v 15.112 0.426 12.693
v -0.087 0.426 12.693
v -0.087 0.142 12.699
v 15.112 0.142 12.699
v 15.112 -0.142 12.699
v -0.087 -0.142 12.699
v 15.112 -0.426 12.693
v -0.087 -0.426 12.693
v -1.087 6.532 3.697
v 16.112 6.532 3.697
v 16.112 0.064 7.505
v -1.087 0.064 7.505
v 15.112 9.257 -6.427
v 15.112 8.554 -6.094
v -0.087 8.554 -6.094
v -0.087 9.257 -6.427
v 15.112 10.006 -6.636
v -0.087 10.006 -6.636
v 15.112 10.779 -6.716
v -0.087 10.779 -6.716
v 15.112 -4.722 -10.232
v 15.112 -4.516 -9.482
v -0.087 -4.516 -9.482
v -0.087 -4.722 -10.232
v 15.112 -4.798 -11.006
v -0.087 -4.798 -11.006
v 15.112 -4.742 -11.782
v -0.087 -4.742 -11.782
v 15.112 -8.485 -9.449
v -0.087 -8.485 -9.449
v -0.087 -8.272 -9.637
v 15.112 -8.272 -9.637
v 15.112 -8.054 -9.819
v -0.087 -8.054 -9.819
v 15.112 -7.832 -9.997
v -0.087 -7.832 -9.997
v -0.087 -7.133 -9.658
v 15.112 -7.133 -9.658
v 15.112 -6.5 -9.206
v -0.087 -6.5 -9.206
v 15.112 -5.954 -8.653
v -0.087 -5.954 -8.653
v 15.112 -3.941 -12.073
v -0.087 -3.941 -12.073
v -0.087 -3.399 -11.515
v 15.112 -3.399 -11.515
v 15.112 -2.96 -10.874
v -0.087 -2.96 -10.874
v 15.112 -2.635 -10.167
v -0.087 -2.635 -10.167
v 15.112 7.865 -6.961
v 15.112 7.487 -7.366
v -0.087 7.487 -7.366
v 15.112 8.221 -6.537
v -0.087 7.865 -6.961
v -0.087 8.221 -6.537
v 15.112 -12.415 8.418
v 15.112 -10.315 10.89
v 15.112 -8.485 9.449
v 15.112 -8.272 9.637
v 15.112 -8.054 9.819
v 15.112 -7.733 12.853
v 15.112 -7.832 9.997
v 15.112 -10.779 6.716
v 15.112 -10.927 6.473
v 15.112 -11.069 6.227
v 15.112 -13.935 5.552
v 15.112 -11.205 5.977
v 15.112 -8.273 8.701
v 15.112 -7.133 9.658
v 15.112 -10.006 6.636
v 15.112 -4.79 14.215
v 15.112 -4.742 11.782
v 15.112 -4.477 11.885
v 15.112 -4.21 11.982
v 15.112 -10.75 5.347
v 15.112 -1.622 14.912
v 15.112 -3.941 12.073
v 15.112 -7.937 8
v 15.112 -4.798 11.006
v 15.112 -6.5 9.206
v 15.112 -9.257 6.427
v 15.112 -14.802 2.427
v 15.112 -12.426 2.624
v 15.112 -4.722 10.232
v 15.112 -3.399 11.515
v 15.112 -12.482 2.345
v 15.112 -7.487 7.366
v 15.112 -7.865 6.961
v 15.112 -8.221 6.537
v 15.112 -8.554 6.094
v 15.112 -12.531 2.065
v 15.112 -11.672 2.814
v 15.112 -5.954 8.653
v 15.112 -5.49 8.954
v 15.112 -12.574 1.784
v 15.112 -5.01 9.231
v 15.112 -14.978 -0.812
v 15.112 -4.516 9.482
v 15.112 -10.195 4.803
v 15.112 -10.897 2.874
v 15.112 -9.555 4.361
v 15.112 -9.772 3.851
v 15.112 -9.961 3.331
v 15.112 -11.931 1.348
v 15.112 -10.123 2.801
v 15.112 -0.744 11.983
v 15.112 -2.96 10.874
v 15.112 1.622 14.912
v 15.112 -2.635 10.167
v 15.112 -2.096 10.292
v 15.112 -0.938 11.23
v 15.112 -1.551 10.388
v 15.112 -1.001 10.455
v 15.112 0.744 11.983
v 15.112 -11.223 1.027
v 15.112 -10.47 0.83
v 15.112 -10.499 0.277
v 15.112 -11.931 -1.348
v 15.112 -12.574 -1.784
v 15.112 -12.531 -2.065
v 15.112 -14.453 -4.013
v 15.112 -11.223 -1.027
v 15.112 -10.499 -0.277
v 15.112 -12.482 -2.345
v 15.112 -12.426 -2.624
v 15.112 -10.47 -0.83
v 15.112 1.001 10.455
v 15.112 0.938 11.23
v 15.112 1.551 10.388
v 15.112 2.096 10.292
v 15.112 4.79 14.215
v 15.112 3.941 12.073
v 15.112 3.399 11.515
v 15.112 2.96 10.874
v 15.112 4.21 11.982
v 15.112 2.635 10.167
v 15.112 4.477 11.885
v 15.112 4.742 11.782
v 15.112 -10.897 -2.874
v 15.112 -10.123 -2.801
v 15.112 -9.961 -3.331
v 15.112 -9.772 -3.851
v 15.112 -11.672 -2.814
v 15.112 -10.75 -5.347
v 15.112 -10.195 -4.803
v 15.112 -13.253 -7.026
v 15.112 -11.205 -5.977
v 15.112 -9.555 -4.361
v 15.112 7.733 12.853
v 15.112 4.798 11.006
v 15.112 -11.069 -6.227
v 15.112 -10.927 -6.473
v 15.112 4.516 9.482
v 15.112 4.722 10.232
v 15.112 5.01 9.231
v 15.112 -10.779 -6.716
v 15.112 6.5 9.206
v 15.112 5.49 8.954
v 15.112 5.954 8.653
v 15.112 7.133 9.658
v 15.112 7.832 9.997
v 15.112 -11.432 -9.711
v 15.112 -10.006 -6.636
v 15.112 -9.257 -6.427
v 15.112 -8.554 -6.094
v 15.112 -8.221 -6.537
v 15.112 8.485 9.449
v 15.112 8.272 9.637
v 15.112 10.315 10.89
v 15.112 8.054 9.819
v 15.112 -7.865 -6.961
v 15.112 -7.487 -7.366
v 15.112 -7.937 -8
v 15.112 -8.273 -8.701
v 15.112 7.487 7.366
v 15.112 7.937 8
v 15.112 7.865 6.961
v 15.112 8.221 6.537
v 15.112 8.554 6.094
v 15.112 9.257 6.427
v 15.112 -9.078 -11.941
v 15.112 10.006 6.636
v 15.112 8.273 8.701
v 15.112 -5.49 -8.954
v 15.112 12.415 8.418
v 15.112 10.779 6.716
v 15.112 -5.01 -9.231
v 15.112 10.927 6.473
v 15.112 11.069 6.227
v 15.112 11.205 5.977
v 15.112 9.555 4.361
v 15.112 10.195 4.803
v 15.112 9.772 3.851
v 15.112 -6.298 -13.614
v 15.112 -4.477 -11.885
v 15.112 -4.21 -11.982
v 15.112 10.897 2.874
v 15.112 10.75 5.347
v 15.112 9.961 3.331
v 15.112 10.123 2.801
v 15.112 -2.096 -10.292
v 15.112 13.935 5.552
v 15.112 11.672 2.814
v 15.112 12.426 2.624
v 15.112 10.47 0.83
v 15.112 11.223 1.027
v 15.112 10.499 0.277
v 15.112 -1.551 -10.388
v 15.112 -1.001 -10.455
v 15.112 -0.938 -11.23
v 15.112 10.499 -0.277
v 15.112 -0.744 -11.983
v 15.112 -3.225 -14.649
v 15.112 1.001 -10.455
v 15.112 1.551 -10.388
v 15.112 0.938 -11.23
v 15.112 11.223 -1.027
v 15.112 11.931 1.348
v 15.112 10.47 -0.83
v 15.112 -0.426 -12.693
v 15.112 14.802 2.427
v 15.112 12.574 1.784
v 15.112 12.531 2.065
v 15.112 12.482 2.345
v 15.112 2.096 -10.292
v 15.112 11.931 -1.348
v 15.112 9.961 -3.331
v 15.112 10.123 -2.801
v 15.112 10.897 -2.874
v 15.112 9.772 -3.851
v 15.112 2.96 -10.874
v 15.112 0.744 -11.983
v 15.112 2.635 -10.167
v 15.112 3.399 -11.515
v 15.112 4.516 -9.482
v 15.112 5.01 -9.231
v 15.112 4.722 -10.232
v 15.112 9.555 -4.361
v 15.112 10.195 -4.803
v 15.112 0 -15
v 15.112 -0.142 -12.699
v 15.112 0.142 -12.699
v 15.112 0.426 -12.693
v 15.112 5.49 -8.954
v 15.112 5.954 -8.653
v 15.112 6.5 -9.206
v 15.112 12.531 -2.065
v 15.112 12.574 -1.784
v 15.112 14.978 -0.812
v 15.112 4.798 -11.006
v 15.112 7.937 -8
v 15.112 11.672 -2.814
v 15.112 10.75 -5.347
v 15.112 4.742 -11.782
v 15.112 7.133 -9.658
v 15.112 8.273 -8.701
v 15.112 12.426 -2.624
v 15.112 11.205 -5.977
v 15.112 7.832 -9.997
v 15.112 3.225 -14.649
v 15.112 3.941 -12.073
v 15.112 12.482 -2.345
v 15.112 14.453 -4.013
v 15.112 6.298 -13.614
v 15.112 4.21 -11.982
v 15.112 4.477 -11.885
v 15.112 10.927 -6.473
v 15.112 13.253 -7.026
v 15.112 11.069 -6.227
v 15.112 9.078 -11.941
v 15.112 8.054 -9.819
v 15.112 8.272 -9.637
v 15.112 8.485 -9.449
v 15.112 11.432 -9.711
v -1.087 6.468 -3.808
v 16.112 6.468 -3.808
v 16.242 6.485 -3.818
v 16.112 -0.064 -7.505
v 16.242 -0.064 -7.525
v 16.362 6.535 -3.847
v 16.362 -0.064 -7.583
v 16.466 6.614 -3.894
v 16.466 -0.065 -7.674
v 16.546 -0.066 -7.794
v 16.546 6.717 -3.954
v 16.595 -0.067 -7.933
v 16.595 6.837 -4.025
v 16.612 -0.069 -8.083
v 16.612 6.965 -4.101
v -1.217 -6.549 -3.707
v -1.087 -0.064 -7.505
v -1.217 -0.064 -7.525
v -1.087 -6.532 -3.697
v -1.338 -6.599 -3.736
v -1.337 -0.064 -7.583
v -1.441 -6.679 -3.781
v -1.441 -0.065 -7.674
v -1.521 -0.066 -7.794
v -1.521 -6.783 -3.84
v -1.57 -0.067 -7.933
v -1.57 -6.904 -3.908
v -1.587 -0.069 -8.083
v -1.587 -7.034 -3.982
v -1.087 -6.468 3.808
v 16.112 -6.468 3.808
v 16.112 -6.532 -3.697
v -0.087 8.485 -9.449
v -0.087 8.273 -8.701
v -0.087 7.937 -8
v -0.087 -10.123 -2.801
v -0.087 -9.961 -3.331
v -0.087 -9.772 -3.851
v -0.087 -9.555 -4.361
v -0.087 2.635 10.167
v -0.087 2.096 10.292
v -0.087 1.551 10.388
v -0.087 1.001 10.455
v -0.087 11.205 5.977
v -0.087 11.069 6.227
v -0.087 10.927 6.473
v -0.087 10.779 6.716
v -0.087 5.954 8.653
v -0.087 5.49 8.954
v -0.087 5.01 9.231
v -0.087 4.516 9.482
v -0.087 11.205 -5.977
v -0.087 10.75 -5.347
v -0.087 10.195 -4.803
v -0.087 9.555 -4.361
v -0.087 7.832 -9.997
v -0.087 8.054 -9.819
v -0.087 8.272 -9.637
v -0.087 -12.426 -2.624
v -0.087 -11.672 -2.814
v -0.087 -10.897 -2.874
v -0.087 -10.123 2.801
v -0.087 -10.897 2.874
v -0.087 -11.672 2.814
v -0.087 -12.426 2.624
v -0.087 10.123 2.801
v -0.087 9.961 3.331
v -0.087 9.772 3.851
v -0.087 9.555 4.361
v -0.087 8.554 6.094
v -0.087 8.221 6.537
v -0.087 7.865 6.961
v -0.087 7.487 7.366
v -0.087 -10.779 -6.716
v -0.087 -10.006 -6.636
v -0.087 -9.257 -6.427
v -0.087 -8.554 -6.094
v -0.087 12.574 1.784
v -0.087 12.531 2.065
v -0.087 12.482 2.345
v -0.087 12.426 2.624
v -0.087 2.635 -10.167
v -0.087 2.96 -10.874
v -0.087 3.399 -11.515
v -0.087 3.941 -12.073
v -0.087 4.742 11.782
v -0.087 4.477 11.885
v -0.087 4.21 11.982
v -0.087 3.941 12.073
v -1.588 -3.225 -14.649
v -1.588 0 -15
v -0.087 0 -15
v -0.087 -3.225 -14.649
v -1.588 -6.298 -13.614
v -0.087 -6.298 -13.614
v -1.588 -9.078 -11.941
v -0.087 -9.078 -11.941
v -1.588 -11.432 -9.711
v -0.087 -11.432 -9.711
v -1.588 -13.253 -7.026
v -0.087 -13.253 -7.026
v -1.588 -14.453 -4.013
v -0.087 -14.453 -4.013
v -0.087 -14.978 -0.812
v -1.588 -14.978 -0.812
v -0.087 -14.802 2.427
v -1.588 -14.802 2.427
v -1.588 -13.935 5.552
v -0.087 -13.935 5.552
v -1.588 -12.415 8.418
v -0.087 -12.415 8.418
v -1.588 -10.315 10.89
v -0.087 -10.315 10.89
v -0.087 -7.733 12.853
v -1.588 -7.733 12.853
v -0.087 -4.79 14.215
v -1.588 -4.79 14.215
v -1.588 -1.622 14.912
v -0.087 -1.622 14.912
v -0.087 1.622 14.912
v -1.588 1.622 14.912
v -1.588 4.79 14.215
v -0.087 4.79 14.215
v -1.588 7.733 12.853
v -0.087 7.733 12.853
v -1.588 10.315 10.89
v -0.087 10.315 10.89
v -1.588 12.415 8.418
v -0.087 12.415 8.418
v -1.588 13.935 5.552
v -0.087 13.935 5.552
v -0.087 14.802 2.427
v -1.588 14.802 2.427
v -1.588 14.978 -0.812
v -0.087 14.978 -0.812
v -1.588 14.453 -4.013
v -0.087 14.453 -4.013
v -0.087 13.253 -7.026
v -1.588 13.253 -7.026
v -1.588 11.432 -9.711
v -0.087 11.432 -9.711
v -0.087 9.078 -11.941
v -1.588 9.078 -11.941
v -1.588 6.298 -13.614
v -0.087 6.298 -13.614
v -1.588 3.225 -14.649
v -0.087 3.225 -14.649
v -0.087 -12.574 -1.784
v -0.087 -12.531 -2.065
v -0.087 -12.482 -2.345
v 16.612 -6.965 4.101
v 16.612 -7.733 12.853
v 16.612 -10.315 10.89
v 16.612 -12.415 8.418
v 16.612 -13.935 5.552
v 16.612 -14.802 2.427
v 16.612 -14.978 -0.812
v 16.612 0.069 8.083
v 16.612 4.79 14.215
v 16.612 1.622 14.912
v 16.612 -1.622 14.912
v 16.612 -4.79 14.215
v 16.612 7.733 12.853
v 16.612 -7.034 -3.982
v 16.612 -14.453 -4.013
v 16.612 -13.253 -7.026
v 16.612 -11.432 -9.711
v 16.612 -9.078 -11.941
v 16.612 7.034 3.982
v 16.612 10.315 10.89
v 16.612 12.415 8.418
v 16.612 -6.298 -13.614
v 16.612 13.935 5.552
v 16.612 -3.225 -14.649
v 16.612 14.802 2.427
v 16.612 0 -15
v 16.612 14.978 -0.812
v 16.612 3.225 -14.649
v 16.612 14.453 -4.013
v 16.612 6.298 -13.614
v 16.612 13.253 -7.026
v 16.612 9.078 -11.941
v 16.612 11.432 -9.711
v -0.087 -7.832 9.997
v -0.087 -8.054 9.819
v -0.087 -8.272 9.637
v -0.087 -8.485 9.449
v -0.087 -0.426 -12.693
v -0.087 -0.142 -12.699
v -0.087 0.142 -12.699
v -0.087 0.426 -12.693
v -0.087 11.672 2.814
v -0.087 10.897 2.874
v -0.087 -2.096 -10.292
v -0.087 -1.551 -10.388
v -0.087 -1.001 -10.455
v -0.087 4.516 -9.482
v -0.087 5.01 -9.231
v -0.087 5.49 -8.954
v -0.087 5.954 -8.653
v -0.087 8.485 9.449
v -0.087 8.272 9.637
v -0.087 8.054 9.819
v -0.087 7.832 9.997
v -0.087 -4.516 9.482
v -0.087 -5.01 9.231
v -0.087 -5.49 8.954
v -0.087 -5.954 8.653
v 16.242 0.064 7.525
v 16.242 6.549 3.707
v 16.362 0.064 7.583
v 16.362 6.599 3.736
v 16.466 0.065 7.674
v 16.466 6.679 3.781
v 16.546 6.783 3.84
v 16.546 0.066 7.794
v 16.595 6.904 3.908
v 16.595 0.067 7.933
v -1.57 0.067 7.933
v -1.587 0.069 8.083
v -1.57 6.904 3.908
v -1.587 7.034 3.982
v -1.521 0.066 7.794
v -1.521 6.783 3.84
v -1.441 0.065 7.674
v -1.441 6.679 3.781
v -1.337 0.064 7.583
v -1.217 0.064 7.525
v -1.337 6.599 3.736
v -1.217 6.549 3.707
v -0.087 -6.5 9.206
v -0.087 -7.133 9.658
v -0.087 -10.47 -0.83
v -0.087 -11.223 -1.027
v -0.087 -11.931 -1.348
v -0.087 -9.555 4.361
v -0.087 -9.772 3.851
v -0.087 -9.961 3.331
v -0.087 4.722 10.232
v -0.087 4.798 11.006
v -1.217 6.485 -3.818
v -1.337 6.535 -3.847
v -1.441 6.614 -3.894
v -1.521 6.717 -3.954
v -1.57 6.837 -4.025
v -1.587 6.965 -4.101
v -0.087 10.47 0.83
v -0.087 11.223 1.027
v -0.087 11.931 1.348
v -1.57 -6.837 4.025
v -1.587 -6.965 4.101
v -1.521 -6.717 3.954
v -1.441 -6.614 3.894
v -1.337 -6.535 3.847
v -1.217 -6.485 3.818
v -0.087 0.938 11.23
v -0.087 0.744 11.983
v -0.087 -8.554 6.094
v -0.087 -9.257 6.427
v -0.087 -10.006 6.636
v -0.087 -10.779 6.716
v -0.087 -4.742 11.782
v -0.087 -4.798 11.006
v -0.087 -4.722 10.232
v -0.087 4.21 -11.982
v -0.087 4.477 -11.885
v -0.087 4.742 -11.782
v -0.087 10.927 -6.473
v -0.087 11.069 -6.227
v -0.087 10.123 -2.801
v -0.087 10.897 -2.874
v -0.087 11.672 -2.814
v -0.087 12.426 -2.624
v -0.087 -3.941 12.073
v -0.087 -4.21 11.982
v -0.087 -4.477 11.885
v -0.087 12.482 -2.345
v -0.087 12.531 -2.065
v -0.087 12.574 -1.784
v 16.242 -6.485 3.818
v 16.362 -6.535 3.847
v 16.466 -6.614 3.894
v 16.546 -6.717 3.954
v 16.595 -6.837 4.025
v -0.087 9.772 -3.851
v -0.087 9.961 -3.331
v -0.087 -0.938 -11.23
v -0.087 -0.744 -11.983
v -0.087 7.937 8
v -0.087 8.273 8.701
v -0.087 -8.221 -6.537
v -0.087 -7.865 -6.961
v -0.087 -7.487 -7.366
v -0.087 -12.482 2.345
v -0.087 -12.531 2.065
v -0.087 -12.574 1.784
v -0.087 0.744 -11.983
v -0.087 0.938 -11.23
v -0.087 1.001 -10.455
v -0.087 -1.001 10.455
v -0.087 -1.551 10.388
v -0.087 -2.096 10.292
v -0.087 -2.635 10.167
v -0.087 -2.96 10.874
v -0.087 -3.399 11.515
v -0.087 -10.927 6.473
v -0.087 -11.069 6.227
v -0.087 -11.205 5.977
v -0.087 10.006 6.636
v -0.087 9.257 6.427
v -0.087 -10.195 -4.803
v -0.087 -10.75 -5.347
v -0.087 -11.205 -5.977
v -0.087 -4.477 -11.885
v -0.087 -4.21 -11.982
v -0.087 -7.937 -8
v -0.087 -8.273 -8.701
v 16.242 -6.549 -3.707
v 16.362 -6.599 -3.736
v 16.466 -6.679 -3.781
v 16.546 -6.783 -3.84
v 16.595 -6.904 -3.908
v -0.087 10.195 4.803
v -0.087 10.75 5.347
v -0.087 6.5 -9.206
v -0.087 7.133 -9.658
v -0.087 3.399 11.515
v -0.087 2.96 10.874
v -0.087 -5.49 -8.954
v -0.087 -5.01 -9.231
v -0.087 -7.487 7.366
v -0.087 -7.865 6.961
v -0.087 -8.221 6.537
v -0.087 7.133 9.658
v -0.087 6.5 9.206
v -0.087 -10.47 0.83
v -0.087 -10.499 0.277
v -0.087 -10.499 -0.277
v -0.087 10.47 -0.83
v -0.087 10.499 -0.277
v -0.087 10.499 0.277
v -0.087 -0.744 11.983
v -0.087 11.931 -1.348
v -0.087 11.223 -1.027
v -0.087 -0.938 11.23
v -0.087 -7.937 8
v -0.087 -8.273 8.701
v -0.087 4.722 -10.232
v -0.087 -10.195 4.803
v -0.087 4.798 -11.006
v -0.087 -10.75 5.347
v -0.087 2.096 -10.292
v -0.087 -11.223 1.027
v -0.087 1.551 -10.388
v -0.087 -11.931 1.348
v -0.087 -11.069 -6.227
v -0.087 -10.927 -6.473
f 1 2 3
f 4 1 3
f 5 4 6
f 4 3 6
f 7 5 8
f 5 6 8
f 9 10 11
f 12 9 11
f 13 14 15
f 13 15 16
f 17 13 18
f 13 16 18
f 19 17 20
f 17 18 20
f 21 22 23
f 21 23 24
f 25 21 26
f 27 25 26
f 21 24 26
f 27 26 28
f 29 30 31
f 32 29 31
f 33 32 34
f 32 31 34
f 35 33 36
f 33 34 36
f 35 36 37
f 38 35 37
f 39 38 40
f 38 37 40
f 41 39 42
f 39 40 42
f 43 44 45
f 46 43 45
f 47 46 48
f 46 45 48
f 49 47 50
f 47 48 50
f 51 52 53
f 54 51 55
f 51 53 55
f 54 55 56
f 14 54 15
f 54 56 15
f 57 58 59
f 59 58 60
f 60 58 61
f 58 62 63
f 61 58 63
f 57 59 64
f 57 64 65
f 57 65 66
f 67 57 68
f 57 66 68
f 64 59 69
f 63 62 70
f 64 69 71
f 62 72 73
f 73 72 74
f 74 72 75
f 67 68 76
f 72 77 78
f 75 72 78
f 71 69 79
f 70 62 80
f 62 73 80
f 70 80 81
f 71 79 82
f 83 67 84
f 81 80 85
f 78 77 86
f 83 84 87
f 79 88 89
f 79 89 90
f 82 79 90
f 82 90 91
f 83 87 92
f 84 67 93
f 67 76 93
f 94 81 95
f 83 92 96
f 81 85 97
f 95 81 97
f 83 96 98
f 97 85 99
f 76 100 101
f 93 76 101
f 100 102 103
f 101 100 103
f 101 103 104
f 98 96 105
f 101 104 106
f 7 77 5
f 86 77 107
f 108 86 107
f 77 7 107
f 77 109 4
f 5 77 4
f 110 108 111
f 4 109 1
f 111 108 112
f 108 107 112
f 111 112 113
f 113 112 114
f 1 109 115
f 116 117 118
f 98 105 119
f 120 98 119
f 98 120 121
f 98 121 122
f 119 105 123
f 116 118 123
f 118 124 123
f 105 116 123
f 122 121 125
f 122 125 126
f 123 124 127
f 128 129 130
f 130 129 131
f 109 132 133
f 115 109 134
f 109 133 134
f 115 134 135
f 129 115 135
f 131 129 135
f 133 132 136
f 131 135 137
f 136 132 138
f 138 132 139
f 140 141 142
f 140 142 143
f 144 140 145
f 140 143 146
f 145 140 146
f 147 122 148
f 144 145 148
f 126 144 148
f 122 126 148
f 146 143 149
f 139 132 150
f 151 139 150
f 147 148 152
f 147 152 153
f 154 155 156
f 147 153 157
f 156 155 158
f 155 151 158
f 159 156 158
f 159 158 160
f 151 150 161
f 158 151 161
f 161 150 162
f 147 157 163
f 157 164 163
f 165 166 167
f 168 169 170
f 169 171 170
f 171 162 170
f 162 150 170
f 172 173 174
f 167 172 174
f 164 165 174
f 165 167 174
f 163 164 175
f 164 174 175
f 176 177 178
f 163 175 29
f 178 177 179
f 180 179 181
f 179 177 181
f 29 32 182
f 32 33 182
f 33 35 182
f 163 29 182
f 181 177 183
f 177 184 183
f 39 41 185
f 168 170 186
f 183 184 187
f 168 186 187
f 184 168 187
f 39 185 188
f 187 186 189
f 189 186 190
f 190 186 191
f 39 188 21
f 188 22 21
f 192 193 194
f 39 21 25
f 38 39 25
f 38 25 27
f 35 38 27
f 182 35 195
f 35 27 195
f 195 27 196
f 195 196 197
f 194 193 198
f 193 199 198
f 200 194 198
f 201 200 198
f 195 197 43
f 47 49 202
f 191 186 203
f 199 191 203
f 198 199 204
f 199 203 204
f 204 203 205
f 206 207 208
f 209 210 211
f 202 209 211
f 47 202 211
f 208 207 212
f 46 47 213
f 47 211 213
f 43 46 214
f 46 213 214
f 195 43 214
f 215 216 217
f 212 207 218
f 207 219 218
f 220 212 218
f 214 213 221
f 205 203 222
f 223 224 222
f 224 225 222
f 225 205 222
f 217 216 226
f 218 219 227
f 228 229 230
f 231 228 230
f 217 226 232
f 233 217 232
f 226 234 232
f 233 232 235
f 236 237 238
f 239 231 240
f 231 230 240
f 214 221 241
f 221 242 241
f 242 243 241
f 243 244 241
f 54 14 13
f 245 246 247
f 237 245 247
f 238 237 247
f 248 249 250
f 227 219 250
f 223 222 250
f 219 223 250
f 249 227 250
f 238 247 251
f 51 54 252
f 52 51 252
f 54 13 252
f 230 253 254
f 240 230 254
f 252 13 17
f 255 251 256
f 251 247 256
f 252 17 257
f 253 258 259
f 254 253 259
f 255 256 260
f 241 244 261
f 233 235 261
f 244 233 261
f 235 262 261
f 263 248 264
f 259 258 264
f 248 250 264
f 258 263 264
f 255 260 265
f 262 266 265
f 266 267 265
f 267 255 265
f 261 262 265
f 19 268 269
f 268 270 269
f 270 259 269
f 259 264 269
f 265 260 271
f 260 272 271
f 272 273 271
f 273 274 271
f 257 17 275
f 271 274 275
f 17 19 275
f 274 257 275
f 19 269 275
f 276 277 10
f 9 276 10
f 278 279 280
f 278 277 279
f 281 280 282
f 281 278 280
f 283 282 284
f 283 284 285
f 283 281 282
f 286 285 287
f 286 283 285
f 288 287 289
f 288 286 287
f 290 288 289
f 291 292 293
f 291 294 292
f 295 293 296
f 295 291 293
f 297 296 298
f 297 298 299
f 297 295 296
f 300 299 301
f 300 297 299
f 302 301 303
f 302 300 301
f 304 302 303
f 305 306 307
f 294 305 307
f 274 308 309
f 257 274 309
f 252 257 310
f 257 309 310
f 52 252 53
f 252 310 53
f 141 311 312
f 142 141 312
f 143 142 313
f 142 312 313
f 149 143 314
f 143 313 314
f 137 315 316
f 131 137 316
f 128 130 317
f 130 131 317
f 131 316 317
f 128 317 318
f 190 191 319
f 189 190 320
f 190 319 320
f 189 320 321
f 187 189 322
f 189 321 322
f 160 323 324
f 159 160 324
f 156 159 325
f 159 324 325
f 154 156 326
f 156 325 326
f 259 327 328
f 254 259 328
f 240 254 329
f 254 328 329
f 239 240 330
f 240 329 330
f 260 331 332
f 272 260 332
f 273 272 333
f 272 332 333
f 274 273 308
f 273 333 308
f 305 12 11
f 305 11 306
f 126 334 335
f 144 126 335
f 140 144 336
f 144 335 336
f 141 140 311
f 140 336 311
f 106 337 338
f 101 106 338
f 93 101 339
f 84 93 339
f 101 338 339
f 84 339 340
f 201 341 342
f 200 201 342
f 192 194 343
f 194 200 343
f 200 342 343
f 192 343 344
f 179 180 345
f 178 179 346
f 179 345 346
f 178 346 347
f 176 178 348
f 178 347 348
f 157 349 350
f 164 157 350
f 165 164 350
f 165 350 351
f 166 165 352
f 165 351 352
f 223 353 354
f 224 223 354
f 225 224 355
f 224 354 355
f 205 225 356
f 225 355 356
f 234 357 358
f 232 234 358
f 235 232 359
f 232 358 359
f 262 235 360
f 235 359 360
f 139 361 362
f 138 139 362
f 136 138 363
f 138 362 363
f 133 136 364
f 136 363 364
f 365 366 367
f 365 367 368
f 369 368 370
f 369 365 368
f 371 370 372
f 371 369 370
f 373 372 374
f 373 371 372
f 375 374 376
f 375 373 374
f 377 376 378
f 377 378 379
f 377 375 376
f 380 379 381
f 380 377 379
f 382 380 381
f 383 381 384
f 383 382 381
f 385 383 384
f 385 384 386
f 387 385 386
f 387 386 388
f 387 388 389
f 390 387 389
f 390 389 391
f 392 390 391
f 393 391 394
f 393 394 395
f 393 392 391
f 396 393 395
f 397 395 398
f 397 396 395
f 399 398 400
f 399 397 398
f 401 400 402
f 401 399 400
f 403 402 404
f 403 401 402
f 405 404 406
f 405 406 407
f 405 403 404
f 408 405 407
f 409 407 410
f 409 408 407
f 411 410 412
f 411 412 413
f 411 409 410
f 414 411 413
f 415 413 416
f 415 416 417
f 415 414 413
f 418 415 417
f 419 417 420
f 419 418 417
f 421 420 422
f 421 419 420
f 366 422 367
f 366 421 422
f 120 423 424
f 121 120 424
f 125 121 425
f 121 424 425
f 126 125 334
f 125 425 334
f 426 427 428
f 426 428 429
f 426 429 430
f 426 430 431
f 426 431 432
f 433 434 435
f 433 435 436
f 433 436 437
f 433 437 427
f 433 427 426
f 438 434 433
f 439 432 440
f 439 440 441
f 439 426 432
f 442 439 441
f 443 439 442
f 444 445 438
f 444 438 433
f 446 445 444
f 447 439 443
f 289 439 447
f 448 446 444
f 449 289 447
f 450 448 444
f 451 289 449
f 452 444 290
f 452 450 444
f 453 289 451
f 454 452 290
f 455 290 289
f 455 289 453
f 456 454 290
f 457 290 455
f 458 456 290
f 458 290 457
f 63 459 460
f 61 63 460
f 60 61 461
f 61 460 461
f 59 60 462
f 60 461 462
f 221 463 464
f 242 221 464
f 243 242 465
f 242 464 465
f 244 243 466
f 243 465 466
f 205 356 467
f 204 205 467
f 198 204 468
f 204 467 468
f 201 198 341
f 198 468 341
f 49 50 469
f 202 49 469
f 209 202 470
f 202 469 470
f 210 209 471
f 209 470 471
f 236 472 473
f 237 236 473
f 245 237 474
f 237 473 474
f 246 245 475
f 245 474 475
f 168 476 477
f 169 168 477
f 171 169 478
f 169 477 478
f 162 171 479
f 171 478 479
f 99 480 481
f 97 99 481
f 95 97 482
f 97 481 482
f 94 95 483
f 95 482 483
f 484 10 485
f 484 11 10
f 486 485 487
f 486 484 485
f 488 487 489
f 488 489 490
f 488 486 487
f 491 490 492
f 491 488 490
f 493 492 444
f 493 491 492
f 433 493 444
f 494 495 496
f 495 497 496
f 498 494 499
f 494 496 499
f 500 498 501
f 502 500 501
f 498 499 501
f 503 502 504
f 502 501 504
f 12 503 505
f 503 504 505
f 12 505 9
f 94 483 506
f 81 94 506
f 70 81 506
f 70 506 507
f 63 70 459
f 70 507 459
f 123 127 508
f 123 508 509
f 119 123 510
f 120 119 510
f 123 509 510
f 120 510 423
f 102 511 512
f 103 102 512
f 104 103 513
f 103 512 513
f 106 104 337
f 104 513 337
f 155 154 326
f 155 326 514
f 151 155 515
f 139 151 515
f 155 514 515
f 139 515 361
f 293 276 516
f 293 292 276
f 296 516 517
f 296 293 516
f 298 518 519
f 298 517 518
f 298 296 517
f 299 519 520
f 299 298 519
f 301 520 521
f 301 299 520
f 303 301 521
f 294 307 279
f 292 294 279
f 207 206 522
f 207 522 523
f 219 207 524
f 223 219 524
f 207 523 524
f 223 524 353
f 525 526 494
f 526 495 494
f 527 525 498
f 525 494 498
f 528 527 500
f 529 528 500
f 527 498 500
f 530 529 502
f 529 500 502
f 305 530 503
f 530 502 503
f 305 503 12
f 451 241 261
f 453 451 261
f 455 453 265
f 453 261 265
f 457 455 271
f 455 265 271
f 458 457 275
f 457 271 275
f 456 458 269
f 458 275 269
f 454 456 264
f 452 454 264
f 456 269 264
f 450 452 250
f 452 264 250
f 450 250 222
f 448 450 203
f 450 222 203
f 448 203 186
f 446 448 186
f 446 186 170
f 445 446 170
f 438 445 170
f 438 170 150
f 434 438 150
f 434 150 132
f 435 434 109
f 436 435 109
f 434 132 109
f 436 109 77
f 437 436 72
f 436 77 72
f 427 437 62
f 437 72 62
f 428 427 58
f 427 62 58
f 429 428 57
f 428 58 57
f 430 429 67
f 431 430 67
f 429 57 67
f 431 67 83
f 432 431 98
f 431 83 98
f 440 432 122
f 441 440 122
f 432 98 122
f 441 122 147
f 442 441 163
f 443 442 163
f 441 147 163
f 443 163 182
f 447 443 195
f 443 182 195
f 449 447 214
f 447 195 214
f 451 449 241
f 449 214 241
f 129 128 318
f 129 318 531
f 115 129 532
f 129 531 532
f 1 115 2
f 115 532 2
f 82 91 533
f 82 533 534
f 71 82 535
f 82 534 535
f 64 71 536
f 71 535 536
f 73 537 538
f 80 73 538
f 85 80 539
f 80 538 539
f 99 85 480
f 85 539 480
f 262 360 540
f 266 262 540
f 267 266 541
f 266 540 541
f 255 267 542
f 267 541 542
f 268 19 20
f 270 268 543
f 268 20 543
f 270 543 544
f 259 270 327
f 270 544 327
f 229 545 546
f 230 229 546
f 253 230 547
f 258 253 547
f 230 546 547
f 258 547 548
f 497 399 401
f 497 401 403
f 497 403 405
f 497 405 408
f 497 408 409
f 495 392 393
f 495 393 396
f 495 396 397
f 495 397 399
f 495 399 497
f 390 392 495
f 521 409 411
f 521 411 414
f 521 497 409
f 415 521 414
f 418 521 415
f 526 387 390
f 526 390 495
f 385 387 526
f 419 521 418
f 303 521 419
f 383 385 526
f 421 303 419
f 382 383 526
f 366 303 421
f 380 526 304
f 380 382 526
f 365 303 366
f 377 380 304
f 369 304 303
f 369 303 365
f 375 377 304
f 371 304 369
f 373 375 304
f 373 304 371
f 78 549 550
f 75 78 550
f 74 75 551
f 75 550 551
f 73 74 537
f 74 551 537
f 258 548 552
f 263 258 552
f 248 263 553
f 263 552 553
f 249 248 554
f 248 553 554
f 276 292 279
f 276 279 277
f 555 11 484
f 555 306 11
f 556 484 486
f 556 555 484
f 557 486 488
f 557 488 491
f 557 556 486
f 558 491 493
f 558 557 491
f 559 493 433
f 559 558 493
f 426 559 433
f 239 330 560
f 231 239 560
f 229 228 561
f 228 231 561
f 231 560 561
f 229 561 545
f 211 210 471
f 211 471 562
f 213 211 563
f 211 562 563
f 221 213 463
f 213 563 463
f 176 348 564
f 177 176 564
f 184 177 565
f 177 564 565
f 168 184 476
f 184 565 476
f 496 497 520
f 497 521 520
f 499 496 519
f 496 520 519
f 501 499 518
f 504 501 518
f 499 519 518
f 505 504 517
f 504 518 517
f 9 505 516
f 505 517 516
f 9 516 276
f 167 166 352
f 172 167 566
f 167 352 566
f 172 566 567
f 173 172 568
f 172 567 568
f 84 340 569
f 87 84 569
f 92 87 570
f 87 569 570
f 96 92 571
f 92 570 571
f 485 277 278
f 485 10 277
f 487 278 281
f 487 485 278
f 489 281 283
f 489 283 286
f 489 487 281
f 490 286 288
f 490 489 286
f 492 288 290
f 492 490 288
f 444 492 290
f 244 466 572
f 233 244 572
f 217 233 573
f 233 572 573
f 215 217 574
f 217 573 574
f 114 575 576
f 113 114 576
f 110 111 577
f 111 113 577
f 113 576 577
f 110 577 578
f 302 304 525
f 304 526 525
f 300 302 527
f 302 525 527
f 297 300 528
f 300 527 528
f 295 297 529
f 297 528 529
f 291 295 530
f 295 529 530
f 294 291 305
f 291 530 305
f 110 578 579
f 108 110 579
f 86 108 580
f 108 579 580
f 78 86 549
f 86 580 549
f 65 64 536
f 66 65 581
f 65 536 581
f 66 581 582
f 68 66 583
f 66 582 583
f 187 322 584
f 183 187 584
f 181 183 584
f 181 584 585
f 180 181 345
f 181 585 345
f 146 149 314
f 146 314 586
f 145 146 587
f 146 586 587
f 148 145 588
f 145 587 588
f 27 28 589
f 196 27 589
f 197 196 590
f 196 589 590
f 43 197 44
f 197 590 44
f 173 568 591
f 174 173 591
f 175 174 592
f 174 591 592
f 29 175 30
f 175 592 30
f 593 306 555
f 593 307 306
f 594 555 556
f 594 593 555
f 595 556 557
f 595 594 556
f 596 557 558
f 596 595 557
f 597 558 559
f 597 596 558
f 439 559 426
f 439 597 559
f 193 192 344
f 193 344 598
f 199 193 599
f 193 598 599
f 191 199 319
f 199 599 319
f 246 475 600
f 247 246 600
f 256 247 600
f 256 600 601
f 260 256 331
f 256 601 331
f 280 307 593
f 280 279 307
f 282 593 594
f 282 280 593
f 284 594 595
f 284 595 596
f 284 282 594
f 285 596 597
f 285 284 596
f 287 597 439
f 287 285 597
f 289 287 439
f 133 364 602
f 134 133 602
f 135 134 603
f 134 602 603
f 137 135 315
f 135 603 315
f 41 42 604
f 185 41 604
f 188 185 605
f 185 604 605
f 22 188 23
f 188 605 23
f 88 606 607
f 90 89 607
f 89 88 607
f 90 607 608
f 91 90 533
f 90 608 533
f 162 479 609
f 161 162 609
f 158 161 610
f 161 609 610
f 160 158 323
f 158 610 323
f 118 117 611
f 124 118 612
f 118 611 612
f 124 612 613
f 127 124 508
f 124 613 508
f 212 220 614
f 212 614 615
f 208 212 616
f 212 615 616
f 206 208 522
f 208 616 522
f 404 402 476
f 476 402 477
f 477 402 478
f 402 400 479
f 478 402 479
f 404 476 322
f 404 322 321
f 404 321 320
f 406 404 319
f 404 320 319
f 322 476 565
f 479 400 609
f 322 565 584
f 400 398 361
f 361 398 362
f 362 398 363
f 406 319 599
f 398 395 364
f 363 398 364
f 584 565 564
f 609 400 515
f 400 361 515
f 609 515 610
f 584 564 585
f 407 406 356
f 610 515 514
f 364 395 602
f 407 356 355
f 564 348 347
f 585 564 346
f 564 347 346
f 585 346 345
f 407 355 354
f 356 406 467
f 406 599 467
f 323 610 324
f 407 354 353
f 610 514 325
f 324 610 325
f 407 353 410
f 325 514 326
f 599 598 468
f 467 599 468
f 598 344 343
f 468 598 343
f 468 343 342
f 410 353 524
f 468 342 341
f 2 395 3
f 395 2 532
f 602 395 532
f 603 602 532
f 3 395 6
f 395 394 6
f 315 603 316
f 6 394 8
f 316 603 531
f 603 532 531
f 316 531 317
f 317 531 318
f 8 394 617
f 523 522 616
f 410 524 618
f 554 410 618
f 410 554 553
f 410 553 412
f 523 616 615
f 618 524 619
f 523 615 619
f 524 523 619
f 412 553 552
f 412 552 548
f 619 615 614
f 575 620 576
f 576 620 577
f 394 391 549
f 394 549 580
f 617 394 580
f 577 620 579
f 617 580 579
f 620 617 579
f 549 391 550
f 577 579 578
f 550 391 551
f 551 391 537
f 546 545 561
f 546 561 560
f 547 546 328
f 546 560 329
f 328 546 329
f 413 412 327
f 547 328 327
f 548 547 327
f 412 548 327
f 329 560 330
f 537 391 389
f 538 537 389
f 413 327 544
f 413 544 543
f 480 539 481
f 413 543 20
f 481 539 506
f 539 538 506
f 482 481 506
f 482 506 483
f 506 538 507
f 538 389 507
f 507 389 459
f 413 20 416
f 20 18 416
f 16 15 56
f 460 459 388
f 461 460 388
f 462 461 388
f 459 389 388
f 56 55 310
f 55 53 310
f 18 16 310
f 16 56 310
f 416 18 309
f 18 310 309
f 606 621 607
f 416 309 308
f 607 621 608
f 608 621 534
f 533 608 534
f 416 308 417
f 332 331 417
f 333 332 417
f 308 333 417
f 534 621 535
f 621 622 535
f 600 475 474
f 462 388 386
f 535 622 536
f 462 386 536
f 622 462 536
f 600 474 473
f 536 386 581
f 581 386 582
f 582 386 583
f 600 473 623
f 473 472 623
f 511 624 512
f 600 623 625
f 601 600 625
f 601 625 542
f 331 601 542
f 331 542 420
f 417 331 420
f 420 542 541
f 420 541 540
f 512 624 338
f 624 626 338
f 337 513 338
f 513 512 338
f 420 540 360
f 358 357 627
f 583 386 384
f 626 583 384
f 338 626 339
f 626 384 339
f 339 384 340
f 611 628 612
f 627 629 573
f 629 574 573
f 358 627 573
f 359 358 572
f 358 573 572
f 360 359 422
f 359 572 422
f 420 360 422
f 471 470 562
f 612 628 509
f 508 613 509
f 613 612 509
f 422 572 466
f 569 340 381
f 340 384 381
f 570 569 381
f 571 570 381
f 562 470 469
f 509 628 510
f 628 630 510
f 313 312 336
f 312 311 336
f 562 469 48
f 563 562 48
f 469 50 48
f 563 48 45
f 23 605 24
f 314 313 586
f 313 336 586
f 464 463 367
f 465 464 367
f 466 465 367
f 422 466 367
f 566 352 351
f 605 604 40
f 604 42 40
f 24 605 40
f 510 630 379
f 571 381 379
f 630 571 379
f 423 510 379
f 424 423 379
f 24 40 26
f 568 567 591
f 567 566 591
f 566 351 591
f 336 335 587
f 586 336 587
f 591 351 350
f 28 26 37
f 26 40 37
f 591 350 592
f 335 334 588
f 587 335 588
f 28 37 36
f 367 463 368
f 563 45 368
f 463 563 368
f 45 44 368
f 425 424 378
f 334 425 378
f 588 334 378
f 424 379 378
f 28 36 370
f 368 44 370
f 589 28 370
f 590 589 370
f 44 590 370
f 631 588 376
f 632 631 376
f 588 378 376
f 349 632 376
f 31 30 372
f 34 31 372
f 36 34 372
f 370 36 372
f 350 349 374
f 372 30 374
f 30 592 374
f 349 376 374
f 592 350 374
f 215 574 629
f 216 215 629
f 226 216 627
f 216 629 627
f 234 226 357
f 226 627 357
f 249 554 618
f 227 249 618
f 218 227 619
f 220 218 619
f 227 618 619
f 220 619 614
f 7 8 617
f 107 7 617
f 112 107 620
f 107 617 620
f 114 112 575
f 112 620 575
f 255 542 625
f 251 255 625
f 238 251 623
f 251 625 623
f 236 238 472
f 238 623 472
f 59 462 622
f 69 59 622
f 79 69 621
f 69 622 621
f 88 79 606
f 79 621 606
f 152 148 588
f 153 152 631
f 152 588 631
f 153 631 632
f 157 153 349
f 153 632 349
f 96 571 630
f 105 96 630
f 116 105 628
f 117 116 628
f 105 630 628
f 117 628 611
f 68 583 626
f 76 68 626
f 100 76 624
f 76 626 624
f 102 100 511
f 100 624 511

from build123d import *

# Parameters (mm, degrees)
BOSS_EXTRUDE1_START       = -11.2
BOSS_EXTRUDE1_DEPTH       = 15.2
BOSS_EXTRUDE1_START_2     = -11.30300619
BOSS_EXTRUDE1_2_OUTLINE_R = 9.525
BOSS_EXTRUDE1_2_DEPTH     = 0.10300619
BOSS_EXTRUDE1_START_3     = -1.5875
BOSS_EXTRUDE1_3_OUTLINE_R = 9.525
BOSS_EXTRUDE1_3_DEPTH     = 1.39699381
SKETCH2_R                 = 15
SKETCH2_R_2               = 7.854644271
BOSS_EXTRUDE2_DEPTH       = 1.5
SKETCH3_R                 = 15
SKETCH3_R_2               = 9.60106287
BOSS_EXTRUDE3_DEPTH       = 1.5
BOSS_EXTRUDE4_DEPTH       = 1.5
BOSS_EXTRUDE4_DEPTH_BACK  = 16.7
SKETCH5_R                 = 10.503090292
CUT_EXTRUDE1_DEPTH        = 28.950670833
FILLET1_R                 = 0.5
FILLET2_R                 = 0.5


with BuildPart() as part:
    # Boss-Extrude1: read off the stored shape, not the designer's step
    # Boss-Extrude1 outline → Boss-Extrude1 (new body)
    with BuildSketch(Plane(origin=(11.1125, 0, 0), x_dir=(0, 0, -1), z_dir=(1, 0, 0)).offset(BOSS_EXTRUDE1_START)):
        with BuildLine():
            ThreePointArc((12.692845514, 0.426230867), (11.294265748, 0.926615855), (9.809087715, 0.952242218))
            ThreePointArc((9.809087715, 0.952242218), (9.705477367, 1.71133752), (9.543213362, 2.4600906))
            ThreePointArc((9.543213362, 2.4600906), (10.930059468, 2.992132308), (12.073152809, 3.940682842))
            ThreePointArc((12.073152809, 3.940682842), (11.934096284, 4.34365582), (11.781593724, 4.741734842))
            ThreePointArc((11.781593724, 4.741734842), (10.296216892, 4.733600471), (8.891841322, 4.249720572))
            ThreePointArc((8.891841322, 4.249720572), (8.534853559, 4.9276), (8.126286635, 5.575700185))
            ThreePointArc((8.126286635, 5.575700185), (9.247526706, 6.549985156), (9.997259693, 7.832292041))
            ThreePointArc((9.997259693, 7.832292041), (9.728764428, 8.163402643), (9.449307854, 8.485315615))
            ThreePointArc((9.449307854, 8.485315615), (8.056292325, 7.96964301), (6.902107637, 7.034619905))
            ThreePointArc((6.902107637, 7.034619905), (6.334800451, 7.549521196), (5.729209809, 8.01879804))
            ThreePointArc((5.729209809, 8.01879804), (6.449605744, 9.317813127), (6.715549515, 10.779211228))
            ThreePointArc((6.715549515, 10.779211228), (6.35, 10.998522628), (5.977295999, 11.205442095))
            ThreePointArc((5.977295999, 11.205442095), (4.844660004, 10.244428982), (4.079877906, 8.971040258))
            ThreePointArc((4.079877906, 8.971040258), (3.370676917, 9.260858716), (2.641105726, 9.494710506))
            ThreePointArc((2.641105726, 9.494710506), (2.873767144, 10.961775319), (2.623844955, 12.425998457))
            ThreePointArc((2.623844955, 12.425998457), (2.205331856, 12.507058463), (1.784334031, 12.574026883))
            ThreePointArc((1.784334031, 12.574026883), (1.048690187, 11.283585627), (0.765554687, 9.825420757))
            ThreePointArc((0.765554687, 9.825420757), (0, 9.8552), (-0.765554687, 9.825420757))
            ThreePointArc((-0.765554687, 9.825420757), (-1.048690187, 11.283585627), (-1.784334031, 12.574026883))
            ThreePointArc((-1.784334031, 12.574026883), (-2.205331856, 12.507058463), (-2.623844955, 12.425998457))
            ThreePointArc((-2.623844955, 12.425998457), (-2.873767144, 10.961775319), (-2.641105726, 9.494710506))
            ThreePointArc((-2.641105726, 9.494710506), (-3.370676917, 9.260858716), (-4.079877906, 8.971040258))
            ThreePointArc((-4.079877906, 8.971040258), (-4.844660004, 10.244428982), (-5.977295999, 11.205442095))
            ThreePointArc((-5.977295999, 11.205442095), (-6.35, 10.998522628), (-6.715549515, 10.779211228))
            ThreePointArc((-6.715549515, 10.779211228), (-6.449605744, 9.317813127), (-5.729209809, 8.01879804))
            ThreePointArc((-5.729209809, 8.01879804), (-6.334800451, 7.549521196), (-6.902107637, 7.034619905))
            ThreePointArc((-6.902107637, 7.034619905), (-8.056292325, 7.96964301), (-9.449307854, 8.485315615))
            ThreePointArc((-9.449307854, 8.485315615), (-9.728764428, 8.163402643), (-9.997259693, 7.832292041))
            ThreePointArc((-9.997259693, 7.832292041), (-9.247526706, 6.549985156), (-8.126286635, 5.575700185))
            ThreePointArc((-8.126286635, 5.575700185), (-8.534853559, 4.9276), (-8.891841322, 4.249720572))
            ThreePointArc((-8.891841322, 4.249720572), (-10.296216892, 4.733600471), (-11.781593724, 4.741734842))
            ThreePointArc((-11.781593724, 4.741734842), (-11.934096284, 4.34365582), (-12.073152809, 3.940682842))
            ThreePointArc((-12.073152809, 3.940682842), (-10.930059468, 2.992132308), (-9.543213362, 2.4600906))
            ThreePointArc((-9.543213362, 2.4600906), (-9.705477367, 1.71133752), (-9.809087715, 0.952242218))
            ThreePointArc((-9.809087715, 0.952242218), (-11.294265748, 0.926615855), (-12.692845514, 0.426230867))
            ThreePointArc((-12.692845514, 0.426230867), (-12.7, 0), (-12.692845514, -0.426230867))
            ThreePointArc((-12.692845514, -0.426230867), (-11.294265748, -0.926615855), (-9.809087715, -0.952242218))
            ThreePointArc((-9.809087715, -0.952242218), (-9.705477367, -1.71133752), (-9.543213362, -2.4600906))
            ThreePointArc((-9.543213362, -2.4600906), (-10.930059468, -2.992132308), (-12.073152809, -3.940682842))
            ThreePointArc((-12.073152809, -3.940682842), (-11.934096284, -4.34365582), (-11.781593724, -4.741734842))
            ThreePointArc((-11.781593724, -4.741734842), (-10.296216892, -4.733600471), (-8.891841322, -4.249720572))
            ThreePointArc((-8.891841322, -4.249720572), (-8.534853559, -4.9276), (-8.126286635, -5.575700185))
            ThreePointArc((-8.126286635, -5.575700185), (-9.247526706, -6.549985156), (-9.997259693, -7.832292041))
            ThreePointArc((-9.997259693, -7.832292041), (-9.728764428, -8.163402643), (-9.449307854, -8.485315615))
            ThreePointArc((-9.449307854, -8.485315615), (-8.056292325, -7.96964301), (-6.902107637, -7.034619905))
            ThreePointArc((-6.902107637, -7.034619905), (-6.334800451, -7.549521196), (-5.729209809, -8.01879804))
            ThreePointArc((-5.729209809, -8.01879804), (-6.449605744, -9.317813127), (-6.715549515, -10.779211228))
            ThreePointArc((-6.715549515, -10.779211228), (-6.35, -10.998522628), (-5.977295999, -11.205442095))
            ThreePointArc((-5.977295999, -11.205442095), (-4.844660004, -10.244428982), (-4.079877906, -8.971040258))
            ThreePointArc((-4.079877906, -8.971040258), (-3.370676917, -9.260858716), (-2.641105726, -9.494710506))
            ThreePointArc((-2.641105726, -9.494710506), (-2.873767144, -10.961775319), (-2.623844955, -12.425998457))
            ThreePointArc((-2.623844955, -12.425998457), (-2.205331856, -12.507058463), (-1.784334031, -12.574026883))
            ThreePointArc((-1.784334031, -12.574026883), (-1.048690187, -11.283585627), (-0.765554687, -9.825420757))
            ThreePointArc((-0.765554687, -9.825420757), (0, -9.8552), (0.765554687, -9.825420757))
            ThreePointArc((0.765554687, -9.825420757), (1.048690187, -11.283585627), (1.784334031, -12.574026883))
            ThreePointArc((1.784334031, -12.574026883), (2.205331856, -12.507058463), (2.623844955, -12.425998457))
            ThreePointArc((2.623844955, -12.425998457), (2.873767144, -10.961775319), (2.641105726, -9.494710506))
            ThreePointArc((2.641105726, -9.494710506), (3.370676917, -9.260858716), (4.079877906, -8.971040258))
            ThreePointArc((4.079877906, -8.971040258), (4.844660004, -10.244428982), (5.977295999, -11.205442095))
            ThreePointArc((5.977295999, -11.205442095), (6.35, -10.998522628), (6.715549515, -10.779211228))
            ThreePointArc((6.715549515, -10.779211228), (6.449605744, -9.317813127), (5.729209809, -8.01879804))
            ThreePointArc((5.729209809, -8.01879804), (6.334800451, -7.549521196), (6.902107637, -7.034619905))
            ThreePointArc((6.902107637, -7.034619905), (8.056292325, -7.96964301), (9.449307854, -8.485315615))
            ThreePointArc((9.449307854, -8.485315615), (9.728764428, -8.163402643), (9.997259693, -7.832292041))
            ThreePointArc((9.997259693, -7.832292041), (9.247526706, -6.549985156), (8.126286635, -5.575700185))
            ThreePointArc((8.126286635, -5.575700185), (8.534853559, -4.9276), (8.891841322, -4.249720572))
            ThreePointArc((8.891841322, -4.249720572), (10.296216892, -4.733600471), (11.781593724, -4.741734842))
            ThreePointArc((11.781593724, -4.741734842), (11.934096284, -4.34365582), (12.073152809, -3.940682842))
            ThreePointArc((12.073152809, -3.940682842), (10.930059468, -2.992132308), (9.543213362, -2.4600906))
            ThreePointArc((9.543213362, -2.4600906), (9.705477367, -1.71133752), (9.809087715, -0.952242218))
            ThreePointArc((9.809087715, -0.952242218), (11.294265748, -0.926615855), (12.692845514, -0.426230867))
            ThreePointArc((12.692845514, -0.426230867), (12.7, 0), (12.692845514, 0.426230867))
        make_face()
        Polygon((3.666174209, 6.35), (7.332348419, 0), (3.666174209, -6.35), (-3.666174209, -6.35), (-7.332348419, 0), (-3.666174209, 6.35), align=None, mode=Mode.SUBTRACT)
    extrude(amount=BOSS_EXTRUDE1_DEPTH)

    # Boss-Extrude1 2 outline → Boss-Extrude1 2 (add)
    with BuildSketch(Plane(origin=(11.1125, 0, 0), x_dir=(0, 0, -1), z_dir=(1, 0, 0)).offset(BOSS_EXTRUDE1_START_2)):
        Circle(BOSS_EXTRUDE1_2_OUTLINE_R)
        Polygon((3.666174209, 6.35), (7.332348419, 0), (3.666174209, -6.35), (-3.666174209, -6.35), (-7.332348419, 0), (-3.666174209, 6.35), align=None, mode=Mode.SUBTRACT)
    extrude(amount=BOSS_EXTRUDE1_2_DEPTH)

    # Boss-Extrude1 3 outline → Boss-Extrude1 3 (add)
    with BuildSketch(Plane.YZ.offset(BOSS_EXTRUDE1_START_3)):
        Circle(BOSS_EXTRUDE1_3_OUTLINE_R)
        Polygon((6.35, -3.666174209), (0, -7.332348419), (-6.35, -3.666174209), (-6.35, 3.666174209), (0, 7.332348419), (6.35, 3.666174209), align=None, mode=Mode.SUBTRACT)
    extrude(amount=BOSS_EXTRUDE1_3_DEPTH)

    # Boss-Extrude1 4 outline → Boss-Extrude1 4 (revolve, cut)
    with BuildSketch(Plane.YX):
        Polygon((7.747, -1.5875), (6.34964944, -0.19014944), (6.34964944, -1.5875), align=None)
    revolve(axis=Axis((0, 0, 0), (1, 0, 0)), mode=Mode.SUBTRACT)

    # Sketch2 → Boss-Extrude2 (add)
    with BuildSketch(Plane(origin=(15.1125, 0, 0), x_dir=(0, 0, -1), z_dir=(1, 0, 0))):
        Circle(SKETCH2_R)
        Circle(SKETCH2_R_2, mode=Mode.SUBTRACT)
    extrude(amount=BOSS_EXTRUDE2_DEPTH)

    # Sketch3 → Boss-Extrude3 (add)
    with BuildSketch(Plane.ZY.offset(1.5875)):
        with Locations(Location((0, 0, 0), (0, 0, 180))):
            Circle(SKETCH3_R)
        Circle(SKETCH3_R_2, mode=Mode.SUBTRACT)
    extrude(amount=-BOSS_EXTRUDE3_DEPTH)

    # Sketch5 → Boss-Extrude4 (add, two sides: drawn at the far end of the back side and taken through both)
    with BuildSketch(Plane(origin=(15.1125, 0, 0), x_dir=(0, 0, -1), z_dir=(1, 0, 0)).offset(-BOSS_EXTRUDE4_DEPTH_BACK)):
        Circle(SKETCH5_R)
    extrude(amount=BOSS_EXTRUDE4_DEPTH + BOSS_EXTRUDE4_DEPTH_BACK)

    # Sketch4 → Cut-Extrude1 (cut, through all)
    with BuildSketch(Plane(origin=(16.6125, 0, 0), x_dir=(0, 0, -1), z_dir=(1, 0, 0))):
        Polygon((3.697448436, -6.531631373), (7.505282915, -0.063731412), (3.807834479, 6.467899962), (-3.697448436, 6.531631373), (-7.505282915, 0.063731412), (-3.807834479, -6.467899962), align=None)
    extrude(amount=-CUT_EXTRUDE1_DEPTH, mode=Mode.SUBTRACT)

    # Fillet1
    fillet1_edges = [part.edges().sort_by_distance(p)[0] for p in [
        (16.6125, -6.499765667, 0.055193021),
        (16.6125, -3.297681392, -5.601365676),
        (16.6125, 3.202084275, -5.656558697),
        (16.6125, 6.499765667, -0.055193021),
        (16.6125, 3.297681392, 5.601365676),
        (16.6125, -3.202084275, 5.656558697),
    ]]
    fillet(fillet1_edges, radius=FILLET1_R)

    # Fillet2
    fillet2_edges = [part.edges().sort_by_distance(p)[0] for p in [
        (-1.5875, -6.499765667, 0.055193021),
        (-1.5875, -3.202084275, 5.656558697),
        (-1.5875, 3.297681392, 5.601365676),
        (-1.5875, 6.499765667, -0.055193021),
        (-1.5875, 3.202084275, -5.656558697),
        (-1.5875, -3.297681392, -5.601365676),
    ]]
    fillet(fillet2_edges, radius=FILLET2_R)


solid = part.part
